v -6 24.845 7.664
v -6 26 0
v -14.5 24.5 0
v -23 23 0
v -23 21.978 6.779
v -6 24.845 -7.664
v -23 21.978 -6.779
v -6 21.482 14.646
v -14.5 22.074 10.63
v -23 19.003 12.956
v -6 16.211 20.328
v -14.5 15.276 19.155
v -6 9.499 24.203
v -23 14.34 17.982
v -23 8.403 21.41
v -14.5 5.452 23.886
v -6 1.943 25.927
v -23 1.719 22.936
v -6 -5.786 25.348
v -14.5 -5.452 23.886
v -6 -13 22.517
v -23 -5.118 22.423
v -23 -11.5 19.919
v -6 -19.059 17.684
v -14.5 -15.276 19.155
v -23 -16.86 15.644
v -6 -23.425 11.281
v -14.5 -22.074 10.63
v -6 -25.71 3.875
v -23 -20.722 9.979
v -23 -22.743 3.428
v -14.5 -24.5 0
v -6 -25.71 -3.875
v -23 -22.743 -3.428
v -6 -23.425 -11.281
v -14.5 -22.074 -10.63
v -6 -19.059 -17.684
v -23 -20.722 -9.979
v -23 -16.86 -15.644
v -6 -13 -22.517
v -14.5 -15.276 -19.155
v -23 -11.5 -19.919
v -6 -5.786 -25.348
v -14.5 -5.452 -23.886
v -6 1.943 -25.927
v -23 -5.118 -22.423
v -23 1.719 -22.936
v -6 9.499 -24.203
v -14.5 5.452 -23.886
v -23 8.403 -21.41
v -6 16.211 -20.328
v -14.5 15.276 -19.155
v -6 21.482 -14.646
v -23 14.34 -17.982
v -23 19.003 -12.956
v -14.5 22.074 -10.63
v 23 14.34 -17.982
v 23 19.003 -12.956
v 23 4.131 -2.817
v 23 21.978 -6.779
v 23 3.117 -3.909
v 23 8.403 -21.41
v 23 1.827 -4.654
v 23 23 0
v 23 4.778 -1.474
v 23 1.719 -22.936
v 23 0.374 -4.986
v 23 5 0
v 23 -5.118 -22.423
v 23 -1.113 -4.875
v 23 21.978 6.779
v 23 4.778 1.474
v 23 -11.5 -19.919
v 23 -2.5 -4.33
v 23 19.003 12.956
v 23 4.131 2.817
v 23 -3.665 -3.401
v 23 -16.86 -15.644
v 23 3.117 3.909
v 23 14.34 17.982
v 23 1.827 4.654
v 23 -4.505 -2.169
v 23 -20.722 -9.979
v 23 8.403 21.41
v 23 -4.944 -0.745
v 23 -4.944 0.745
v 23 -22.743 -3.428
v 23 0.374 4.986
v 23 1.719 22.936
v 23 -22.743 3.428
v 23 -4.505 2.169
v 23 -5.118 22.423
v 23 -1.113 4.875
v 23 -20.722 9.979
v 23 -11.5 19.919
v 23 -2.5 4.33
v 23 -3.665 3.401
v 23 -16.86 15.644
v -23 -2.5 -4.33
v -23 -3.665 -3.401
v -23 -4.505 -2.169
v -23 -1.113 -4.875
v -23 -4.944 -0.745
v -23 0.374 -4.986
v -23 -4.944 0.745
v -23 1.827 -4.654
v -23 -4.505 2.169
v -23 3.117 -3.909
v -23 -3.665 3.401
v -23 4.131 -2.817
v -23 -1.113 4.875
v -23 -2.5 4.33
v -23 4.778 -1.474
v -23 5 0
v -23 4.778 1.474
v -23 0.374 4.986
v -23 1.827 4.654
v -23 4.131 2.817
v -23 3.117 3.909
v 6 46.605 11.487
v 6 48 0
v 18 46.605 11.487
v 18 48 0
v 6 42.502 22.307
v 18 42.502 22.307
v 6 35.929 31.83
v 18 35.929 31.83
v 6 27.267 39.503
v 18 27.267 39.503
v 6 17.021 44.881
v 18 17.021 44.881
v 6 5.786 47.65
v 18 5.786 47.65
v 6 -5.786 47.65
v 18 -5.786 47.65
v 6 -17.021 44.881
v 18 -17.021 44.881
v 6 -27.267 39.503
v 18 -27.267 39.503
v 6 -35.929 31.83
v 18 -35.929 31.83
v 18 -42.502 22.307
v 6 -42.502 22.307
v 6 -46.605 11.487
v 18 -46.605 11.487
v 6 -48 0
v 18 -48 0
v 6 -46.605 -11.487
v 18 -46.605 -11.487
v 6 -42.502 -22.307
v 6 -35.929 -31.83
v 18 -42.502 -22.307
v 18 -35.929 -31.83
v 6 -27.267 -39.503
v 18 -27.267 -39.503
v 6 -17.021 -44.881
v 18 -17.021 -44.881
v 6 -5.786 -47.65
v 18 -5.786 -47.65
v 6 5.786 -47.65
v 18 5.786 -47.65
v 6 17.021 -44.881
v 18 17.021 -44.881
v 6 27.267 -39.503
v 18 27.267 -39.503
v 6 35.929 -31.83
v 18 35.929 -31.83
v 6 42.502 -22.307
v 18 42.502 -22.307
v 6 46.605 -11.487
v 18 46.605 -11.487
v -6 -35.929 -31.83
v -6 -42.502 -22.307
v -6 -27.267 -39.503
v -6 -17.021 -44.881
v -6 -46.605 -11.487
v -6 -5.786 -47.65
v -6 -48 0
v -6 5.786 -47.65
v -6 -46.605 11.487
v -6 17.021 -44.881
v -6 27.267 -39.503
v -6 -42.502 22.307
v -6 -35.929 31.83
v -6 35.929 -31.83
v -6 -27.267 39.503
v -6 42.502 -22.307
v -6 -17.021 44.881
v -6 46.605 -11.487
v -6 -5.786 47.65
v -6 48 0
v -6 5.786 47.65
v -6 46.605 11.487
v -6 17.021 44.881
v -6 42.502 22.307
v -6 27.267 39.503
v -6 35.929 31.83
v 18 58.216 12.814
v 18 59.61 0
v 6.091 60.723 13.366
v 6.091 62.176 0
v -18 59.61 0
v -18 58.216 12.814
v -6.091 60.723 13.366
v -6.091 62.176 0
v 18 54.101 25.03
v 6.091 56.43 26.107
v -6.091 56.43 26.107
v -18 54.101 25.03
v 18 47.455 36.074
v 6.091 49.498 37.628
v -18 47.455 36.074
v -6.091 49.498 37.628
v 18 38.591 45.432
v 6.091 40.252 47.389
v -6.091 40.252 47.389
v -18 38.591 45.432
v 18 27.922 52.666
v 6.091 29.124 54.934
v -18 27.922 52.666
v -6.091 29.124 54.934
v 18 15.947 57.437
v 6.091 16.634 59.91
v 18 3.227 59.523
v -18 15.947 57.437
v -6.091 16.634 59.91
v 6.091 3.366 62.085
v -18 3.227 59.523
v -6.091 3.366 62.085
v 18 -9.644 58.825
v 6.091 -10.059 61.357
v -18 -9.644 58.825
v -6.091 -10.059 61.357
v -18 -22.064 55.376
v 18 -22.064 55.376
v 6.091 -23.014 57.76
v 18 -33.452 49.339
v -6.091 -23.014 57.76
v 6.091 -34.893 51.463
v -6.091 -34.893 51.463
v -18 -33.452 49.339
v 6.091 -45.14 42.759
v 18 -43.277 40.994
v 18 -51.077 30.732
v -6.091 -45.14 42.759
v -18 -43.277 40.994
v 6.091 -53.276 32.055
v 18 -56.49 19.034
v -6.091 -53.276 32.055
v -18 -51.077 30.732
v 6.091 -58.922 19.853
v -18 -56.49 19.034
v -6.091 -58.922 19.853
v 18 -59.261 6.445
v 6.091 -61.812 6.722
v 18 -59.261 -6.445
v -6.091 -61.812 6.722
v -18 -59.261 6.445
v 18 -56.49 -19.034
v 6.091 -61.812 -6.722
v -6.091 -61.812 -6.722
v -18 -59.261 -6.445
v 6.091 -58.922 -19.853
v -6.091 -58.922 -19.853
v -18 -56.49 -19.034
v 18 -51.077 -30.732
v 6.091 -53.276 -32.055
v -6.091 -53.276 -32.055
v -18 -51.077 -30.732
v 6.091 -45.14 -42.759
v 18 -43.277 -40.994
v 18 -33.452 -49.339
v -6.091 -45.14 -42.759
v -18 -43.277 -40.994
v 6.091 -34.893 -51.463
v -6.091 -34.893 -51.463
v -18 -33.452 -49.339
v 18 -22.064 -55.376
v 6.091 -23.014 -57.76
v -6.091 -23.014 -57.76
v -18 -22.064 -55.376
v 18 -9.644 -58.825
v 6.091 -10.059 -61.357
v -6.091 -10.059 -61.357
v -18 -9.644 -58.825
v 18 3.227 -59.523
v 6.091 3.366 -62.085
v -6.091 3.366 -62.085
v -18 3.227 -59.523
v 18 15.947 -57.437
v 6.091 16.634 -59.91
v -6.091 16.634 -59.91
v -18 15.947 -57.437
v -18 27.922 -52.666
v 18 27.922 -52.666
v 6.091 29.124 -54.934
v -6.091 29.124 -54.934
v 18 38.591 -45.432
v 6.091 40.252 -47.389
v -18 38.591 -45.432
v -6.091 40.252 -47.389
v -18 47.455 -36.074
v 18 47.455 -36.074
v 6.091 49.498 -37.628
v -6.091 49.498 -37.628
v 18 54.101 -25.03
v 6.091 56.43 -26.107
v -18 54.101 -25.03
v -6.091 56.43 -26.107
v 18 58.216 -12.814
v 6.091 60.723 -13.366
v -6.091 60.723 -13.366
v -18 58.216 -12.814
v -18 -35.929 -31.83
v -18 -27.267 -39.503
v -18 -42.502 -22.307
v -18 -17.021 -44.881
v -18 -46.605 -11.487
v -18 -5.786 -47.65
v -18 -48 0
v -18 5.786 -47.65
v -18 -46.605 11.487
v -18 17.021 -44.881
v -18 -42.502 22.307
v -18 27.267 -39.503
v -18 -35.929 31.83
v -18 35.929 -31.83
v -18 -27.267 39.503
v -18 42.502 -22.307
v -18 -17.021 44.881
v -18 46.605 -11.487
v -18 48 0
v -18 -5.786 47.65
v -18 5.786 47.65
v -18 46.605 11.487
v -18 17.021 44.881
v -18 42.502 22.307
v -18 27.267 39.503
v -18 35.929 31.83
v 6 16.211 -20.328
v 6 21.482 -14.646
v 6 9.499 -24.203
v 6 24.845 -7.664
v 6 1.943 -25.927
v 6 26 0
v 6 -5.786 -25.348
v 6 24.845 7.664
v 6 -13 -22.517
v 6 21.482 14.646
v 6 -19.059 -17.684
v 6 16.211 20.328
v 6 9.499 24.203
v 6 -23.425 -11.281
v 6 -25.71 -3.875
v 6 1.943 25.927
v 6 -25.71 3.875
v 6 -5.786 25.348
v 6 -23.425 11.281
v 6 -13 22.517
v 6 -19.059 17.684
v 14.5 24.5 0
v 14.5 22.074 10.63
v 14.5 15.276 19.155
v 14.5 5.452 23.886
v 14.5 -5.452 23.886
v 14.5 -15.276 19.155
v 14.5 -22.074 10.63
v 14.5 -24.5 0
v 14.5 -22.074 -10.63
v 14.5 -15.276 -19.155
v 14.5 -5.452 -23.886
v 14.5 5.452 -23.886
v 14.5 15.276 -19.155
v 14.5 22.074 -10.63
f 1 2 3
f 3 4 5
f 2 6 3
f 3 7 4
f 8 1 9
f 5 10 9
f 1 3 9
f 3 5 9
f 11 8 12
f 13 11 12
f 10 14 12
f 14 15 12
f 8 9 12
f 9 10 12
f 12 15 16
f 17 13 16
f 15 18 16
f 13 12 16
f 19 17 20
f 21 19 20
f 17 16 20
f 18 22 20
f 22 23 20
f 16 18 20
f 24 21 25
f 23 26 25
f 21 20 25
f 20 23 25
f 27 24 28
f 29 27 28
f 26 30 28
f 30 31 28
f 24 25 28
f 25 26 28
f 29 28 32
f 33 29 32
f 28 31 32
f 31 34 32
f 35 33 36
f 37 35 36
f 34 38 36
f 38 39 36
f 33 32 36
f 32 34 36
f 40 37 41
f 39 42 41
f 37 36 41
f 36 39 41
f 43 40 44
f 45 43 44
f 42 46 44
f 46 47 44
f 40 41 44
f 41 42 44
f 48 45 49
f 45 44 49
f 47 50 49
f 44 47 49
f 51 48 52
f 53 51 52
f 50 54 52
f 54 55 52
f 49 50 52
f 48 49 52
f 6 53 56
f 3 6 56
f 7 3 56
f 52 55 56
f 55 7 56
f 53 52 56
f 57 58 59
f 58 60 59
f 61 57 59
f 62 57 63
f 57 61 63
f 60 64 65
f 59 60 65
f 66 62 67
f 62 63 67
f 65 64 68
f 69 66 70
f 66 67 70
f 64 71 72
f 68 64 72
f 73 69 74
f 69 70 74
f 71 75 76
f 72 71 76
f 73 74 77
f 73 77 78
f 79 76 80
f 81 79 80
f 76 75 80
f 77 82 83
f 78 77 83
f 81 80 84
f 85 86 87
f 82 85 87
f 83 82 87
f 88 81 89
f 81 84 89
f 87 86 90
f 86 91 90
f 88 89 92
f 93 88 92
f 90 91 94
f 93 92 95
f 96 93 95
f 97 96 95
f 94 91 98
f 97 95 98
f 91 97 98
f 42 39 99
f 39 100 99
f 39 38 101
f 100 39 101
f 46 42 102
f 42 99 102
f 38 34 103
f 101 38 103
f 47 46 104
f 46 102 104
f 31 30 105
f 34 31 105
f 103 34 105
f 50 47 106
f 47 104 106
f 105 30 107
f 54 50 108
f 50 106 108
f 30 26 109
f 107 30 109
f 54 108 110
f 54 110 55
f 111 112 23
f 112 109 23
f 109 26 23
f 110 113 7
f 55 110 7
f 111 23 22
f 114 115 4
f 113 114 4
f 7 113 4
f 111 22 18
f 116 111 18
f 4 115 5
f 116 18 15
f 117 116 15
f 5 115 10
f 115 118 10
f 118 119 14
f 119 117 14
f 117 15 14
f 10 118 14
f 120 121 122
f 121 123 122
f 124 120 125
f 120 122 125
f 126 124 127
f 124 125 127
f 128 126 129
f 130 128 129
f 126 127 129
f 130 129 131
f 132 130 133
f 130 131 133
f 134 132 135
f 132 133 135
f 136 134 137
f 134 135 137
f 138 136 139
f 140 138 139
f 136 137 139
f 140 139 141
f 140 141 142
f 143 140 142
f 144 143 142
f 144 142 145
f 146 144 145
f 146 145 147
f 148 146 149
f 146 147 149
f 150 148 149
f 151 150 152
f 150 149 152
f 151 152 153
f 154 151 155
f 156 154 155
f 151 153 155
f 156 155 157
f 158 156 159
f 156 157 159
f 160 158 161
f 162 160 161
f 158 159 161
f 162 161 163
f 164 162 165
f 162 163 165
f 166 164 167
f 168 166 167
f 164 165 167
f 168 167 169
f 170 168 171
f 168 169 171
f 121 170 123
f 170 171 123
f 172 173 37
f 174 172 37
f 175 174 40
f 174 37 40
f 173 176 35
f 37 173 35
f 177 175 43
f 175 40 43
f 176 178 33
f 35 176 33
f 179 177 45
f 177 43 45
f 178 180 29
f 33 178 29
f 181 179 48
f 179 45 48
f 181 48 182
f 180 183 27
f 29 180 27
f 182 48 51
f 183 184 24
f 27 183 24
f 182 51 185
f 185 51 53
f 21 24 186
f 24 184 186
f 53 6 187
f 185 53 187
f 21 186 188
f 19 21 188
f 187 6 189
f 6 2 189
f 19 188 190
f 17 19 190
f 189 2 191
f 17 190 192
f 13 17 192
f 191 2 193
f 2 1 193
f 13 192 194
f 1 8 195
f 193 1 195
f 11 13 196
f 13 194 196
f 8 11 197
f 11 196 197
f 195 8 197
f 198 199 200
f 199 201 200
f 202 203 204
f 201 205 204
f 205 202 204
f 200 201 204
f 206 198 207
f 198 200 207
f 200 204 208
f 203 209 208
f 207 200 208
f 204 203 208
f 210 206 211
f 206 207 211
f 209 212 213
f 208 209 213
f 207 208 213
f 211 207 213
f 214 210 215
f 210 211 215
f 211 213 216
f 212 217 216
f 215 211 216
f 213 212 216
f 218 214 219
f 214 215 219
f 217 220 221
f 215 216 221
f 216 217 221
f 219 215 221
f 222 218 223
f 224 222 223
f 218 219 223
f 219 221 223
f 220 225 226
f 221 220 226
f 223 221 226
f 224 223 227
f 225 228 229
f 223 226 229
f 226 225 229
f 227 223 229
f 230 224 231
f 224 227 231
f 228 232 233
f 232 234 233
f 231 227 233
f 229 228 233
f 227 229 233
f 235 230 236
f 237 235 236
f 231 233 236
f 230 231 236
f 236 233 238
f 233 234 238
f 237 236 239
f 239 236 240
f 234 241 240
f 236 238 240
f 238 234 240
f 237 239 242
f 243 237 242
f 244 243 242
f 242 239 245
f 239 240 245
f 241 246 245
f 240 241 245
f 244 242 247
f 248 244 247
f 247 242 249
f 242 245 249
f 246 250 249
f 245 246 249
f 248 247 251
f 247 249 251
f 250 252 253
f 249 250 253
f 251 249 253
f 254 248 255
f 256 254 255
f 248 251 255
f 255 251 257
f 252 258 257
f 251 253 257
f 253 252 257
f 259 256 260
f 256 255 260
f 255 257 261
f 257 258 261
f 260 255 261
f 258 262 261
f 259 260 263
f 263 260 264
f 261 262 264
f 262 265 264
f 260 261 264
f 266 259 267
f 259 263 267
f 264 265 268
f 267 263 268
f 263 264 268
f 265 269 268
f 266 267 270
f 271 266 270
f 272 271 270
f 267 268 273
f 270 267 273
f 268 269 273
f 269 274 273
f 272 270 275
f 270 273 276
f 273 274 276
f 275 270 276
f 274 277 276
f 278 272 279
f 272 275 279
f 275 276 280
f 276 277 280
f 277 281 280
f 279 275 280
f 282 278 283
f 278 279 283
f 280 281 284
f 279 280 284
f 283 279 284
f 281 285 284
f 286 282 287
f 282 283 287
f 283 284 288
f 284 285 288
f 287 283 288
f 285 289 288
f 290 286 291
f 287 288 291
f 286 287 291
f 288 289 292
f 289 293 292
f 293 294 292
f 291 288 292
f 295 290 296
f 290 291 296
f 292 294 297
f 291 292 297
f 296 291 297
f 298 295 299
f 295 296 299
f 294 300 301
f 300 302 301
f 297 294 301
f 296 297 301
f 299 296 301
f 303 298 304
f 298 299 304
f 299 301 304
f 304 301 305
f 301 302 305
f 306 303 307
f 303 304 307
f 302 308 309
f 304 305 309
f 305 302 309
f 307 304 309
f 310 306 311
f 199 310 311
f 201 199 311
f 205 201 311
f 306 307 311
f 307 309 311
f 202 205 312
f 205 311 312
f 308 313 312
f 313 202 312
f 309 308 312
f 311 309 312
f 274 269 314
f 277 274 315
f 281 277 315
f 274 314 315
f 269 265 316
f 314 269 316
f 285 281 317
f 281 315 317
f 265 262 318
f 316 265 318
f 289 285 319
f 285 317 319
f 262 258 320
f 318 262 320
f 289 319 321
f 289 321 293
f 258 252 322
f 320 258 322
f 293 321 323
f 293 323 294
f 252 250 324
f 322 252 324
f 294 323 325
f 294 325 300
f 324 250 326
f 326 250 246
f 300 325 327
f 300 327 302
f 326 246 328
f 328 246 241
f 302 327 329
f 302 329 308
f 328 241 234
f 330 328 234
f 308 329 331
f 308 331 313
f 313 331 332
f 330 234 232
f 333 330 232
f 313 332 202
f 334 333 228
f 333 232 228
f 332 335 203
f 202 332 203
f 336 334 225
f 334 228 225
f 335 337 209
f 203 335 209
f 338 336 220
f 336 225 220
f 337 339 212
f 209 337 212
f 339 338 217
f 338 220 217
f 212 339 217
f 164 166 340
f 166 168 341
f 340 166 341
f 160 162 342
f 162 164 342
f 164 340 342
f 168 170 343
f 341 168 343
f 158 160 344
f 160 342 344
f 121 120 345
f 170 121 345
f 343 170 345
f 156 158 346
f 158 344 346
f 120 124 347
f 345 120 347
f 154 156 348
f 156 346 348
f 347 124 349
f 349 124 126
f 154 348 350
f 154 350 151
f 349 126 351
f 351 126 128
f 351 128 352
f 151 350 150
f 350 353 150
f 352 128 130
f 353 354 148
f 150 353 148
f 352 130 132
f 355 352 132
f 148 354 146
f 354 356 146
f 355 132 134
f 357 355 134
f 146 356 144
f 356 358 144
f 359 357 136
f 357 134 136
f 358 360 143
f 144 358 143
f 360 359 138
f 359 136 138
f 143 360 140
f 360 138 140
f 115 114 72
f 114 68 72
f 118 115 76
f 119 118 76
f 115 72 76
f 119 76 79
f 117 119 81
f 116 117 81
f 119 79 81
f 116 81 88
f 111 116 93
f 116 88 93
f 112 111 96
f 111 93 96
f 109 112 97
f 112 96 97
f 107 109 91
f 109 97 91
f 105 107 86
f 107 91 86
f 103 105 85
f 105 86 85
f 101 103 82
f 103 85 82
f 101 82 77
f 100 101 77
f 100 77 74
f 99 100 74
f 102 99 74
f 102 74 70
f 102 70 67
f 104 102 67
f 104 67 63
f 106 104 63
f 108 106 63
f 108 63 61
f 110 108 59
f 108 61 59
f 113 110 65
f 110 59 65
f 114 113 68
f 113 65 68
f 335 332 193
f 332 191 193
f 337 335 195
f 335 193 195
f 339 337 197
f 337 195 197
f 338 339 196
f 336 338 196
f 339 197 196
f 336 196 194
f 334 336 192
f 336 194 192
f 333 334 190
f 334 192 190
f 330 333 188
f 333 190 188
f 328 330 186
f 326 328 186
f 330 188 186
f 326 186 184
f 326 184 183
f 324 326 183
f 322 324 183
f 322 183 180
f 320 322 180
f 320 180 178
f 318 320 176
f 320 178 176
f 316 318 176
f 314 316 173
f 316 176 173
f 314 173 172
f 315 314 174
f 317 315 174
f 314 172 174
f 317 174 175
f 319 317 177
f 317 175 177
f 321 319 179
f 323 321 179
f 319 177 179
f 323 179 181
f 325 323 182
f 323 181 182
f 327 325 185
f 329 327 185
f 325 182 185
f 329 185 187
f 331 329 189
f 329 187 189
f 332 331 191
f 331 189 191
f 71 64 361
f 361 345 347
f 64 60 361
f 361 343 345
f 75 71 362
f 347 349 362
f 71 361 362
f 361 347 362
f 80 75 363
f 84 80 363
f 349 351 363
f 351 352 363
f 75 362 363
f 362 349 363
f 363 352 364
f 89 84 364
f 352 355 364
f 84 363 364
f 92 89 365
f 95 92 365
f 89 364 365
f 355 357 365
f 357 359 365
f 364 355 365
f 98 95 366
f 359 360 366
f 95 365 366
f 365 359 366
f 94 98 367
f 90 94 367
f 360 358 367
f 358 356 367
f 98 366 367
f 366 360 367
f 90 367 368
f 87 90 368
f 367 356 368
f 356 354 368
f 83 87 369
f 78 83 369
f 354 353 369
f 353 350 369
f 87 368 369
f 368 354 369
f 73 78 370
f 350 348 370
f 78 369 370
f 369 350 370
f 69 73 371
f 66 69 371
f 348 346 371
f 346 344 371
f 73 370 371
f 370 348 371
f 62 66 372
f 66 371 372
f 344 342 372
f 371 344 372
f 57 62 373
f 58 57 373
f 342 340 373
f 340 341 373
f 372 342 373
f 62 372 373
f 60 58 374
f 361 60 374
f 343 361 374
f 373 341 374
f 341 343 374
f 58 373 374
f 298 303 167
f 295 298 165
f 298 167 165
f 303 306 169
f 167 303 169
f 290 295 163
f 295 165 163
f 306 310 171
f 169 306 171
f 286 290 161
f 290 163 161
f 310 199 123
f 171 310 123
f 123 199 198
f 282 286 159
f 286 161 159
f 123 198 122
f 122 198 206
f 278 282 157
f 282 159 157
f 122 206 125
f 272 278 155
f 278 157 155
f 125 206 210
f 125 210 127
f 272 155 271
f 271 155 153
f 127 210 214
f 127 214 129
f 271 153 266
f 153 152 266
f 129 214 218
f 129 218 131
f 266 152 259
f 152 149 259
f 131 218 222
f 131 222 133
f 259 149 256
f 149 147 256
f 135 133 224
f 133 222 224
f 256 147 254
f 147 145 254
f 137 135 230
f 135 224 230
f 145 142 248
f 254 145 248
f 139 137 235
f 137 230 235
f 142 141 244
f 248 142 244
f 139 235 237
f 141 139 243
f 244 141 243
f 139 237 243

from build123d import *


with BuildPart() as part:
    # Sketch1 → Revolve1 (revolve)
    with BuildSketch(Plane.XY):
        with BuildLine():
            Line((-23, 5), (23, 5))
            Line((23, 5), (23, 23))
            Line((23, 23), (6, 26))
            Line((6, 26), (6, 48))
            Line((6, 48), (18, 48))
            Line((18, 48), (18, 59.609980773))
            ThreePointArc((18, 59.609980773), (0, 62.5), (-18, 59.609980773))
            Line((-18, 59.609980773), (-18, 48))
            Line((-18, 48), (-6, 48))
            Line((-6, 48), (-6, 26))
            Line((-6, 26), (-23, 23))
            Line((-23, 23), (-23, 5))
        make_face()
    revolve(axis=Axis((0, 0, 0), (1, 0, 0)))


solid = part.part
